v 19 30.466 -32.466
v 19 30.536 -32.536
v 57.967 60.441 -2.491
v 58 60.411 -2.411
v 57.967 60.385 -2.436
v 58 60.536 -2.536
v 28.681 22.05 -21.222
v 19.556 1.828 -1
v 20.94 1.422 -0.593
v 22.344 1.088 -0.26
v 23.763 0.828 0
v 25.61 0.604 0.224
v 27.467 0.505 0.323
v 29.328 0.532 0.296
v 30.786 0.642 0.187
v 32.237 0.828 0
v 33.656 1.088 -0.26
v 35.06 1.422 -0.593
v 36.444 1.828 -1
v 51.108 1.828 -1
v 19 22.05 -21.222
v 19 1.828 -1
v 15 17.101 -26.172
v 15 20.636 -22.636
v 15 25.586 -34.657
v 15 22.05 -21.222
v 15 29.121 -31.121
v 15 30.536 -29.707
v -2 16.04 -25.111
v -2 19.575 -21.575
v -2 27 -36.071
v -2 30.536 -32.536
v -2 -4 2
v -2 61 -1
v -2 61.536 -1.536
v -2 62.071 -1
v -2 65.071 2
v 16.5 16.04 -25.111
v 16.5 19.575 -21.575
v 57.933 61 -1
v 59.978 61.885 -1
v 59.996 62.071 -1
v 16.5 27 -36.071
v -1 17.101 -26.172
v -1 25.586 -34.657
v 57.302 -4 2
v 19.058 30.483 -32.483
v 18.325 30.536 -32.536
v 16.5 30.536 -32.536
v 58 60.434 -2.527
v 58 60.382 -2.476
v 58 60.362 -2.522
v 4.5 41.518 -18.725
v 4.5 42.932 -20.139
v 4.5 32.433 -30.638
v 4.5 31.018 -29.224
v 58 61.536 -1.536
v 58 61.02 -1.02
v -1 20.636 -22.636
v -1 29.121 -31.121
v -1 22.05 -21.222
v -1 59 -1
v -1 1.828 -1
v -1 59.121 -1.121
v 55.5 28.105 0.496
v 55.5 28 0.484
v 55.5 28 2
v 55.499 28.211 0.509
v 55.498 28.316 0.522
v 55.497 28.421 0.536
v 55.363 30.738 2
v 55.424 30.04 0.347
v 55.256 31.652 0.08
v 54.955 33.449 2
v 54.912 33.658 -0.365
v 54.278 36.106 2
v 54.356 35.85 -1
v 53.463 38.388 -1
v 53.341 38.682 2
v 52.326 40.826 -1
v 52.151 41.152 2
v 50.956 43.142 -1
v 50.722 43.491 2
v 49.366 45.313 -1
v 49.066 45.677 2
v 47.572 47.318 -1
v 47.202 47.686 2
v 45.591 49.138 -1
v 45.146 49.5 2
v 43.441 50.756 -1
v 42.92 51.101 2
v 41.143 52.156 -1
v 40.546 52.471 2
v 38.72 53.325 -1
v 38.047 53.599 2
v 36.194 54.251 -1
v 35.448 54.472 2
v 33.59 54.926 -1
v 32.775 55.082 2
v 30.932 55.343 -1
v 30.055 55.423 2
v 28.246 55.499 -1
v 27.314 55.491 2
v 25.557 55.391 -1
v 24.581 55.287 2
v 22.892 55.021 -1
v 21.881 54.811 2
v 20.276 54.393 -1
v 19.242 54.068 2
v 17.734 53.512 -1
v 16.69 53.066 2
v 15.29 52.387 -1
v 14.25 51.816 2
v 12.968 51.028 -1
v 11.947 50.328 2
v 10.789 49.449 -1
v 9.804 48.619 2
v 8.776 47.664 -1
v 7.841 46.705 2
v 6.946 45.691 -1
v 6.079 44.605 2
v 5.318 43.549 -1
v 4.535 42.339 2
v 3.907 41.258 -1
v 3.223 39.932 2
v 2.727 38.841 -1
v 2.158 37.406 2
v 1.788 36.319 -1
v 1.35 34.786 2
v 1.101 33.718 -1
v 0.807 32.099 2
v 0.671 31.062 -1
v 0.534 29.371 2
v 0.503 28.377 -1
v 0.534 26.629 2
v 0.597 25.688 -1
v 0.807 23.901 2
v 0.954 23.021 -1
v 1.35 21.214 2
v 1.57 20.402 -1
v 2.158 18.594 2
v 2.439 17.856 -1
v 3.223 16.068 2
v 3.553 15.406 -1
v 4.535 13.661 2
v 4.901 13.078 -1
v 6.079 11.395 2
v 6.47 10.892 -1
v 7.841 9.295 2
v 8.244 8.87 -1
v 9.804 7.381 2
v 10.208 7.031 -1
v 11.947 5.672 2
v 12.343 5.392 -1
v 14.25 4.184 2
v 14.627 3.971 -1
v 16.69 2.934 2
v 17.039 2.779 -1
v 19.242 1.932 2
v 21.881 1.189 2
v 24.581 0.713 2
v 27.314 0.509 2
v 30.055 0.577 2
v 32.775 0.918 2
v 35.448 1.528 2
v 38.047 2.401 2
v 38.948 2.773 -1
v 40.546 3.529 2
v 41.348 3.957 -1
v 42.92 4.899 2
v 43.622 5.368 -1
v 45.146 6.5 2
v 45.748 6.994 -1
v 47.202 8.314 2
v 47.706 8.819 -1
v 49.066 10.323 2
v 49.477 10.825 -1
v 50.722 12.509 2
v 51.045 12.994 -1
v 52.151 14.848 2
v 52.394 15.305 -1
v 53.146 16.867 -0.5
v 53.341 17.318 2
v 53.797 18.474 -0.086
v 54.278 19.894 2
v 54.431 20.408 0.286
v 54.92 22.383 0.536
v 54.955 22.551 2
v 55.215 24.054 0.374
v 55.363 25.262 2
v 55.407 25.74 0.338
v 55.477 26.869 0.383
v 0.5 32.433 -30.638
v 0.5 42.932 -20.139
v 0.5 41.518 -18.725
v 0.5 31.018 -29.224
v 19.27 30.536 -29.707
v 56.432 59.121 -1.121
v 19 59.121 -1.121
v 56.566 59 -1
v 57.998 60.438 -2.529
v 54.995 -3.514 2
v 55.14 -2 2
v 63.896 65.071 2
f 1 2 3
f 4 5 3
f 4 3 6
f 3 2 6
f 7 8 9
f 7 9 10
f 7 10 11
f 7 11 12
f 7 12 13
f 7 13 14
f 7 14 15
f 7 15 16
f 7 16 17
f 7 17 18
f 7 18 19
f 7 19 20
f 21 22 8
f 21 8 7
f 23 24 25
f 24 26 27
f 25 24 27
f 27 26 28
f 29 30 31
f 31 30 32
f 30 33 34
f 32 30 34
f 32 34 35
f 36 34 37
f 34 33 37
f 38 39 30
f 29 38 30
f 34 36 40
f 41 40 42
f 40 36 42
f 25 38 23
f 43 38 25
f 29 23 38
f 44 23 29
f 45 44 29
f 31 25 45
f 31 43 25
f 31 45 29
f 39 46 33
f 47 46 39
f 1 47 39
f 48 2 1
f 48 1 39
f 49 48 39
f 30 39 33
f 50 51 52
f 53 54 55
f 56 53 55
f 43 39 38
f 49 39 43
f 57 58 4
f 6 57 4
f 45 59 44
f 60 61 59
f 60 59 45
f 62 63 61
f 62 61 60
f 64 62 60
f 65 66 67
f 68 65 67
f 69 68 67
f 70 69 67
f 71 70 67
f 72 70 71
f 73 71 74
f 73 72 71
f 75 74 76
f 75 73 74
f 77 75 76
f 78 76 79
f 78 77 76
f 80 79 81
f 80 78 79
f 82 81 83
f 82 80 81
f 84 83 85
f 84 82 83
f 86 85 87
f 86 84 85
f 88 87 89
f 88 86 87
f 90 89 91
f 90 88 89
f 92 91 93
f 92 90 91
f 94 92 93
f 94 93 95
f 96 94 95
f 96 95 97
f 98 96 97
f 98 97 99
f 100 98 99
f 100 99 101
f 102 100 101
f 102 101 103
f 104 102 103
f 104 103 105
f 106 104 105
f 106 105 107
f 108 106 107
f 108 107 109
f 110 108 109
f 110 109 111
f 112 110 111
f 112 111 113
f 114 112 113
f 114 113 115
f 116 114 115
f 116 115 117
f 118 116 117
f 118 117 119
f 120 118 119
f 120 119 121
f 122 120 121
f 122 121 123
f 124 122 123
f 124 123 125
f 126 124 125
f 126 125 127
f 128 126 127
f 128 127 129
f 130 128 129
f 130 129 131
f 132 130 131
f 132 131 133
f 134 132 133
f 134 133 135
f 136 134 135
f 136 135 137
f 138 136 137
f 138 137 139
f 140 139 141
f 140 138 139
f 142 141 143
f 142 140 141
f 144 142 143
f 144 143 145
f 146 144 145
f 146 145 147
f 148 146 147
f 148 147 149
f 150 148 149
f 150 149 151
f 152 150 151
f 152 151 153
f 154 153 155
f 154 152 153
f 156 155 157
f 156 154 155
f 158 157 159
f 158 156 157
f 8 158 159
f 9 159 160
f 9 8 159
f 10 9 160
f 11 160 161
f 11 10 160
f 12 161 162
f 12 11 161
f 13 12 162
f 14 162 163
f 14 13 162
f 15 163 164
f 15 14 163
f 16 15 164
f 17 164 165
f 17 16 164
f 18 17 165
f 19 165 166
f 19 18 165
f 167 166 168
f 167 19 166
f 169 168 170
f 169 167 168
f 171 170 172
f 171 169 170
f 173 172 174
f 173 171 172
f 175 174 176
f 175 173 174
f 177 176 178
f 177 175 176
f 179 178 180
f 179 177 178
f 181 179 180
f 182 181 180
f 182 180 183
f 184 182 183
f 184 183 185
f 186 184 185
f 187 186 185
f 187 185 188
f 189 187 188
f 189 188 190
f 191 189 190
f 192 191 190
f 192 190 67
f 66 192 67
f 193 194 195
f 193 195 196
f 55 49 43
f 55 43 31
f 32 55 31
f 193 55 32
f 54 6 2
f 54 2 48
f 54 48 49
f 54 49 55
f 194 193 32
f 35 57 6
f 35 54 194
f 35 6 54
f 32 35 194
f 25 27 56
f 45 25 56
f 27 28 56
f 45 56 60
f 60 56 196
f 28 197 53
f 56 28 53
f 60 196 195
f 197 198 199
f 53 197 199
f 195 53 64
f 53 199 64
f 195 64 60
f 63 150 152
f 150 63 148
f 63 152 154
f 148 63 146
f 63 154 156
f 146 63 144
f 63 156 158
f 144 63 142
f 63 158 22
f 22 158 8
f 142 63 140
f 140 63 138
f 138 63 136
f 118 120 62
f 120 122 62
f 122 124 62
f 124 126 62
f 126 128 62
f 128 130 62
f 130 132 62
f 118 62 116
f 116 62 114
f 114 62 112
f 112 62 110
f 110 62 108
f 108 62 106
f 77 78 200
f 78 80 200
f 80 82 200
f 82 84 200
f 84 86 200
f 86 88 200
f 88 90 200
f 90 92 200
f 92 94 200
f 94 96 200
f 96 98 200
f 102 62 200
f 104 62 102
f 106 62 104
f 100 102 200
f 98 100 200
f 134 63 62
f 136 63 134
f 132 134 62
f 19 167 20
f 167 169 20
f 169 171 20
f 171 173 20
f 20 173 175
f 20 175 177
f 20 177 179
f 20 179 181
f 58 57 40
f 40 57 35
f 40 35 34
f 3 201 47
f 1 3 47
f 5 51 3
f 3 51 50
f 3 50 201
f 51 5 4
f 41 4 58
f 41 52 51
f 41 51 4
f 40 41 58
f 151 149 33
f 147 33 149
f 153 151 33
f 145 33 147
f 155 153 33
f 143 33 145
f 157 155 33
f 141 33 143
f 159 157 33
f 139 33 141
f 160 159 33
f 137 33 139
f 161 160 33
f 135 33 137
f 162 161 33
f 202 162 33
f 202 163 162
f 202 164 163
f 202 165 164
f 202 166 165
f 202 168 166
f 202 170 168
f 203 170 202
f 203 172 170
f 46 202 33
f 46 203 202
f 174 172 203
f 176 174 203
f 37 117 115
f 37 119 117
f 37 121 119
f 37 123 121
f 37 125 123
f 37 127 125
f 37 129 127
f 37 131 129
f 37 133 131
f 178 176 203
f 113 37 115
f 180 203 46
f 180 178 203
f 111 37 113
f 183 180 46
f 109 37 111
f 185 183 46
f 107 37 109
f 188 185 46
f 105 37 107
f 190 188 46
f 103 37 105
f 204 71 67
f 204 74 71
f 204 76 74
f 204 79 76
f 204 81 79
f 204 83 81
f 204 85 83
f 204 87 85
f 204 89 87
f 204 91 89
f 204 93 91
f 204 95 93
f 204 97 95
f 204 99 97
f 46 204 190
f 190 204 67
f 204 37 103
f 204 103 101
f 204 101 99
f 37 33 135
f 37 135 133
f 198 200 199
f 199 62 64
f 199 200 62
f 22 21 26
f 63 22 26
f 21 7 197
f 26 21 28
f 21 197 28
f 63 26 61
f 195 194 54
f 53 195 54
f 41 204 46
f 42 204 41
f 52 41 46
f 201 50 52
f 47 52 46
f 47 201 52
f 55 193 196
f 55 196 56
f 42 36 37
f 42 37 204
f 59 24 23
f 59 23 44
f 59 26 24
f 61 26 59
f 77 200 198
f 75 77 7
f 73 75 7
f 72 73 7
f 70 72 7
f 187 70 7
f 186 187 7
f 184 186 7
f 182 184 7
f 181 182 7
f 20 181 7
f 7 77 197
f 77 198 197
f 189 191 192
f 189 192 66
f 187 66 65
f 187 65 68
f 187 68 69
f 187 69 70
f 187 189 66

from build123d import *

# Parameters (mm, degrees)
SKETCH1_W            = 60
SKETCH1_H            = 60
SKETCH1_R            = 27.5
BOSS_EXTRUDE2_DEPTH  = 2
BOSS_EXTRUDE3_DEPTH  = 1
BOSS_EXTRUDE4_DEPTH  = 59
BOSS_EXTRUDE5_DEPTH  = 20
SKETCH6_W            = 4
SKETCH6_H            = 14.848240743
CUT_EXTRUDE1_DEPTH   = 20
BOSS_EXTRUDE6_DEPTH  = 2
SKETCH9_W            = 21
SKETCH9_H            = 33.426406871
BOSS_EXTRUDE8_DEPTH  = 2
SKETCH11_W           = 57.719066806
SKETCH11_H           = 59.906444101
BOSS_EXTRUDE9_DEPTH  = 1.5
CUT_EXTRUDE3_DEPTH   = 44.570078861
BOSS_EXTRUDE10_REACH = 41.922
CUT_EXTRUDE4_DEPTH   = 26.5
SKETCH15_W           = 98.795654727
SKETCH15_H           = 69.251879537
CUT_EXTRUDE5_DEPTH   = 59.5
SKETCH16_R           = 67.668555037
CUT_EXTRUDE6_DEPTH   = 1093.5
SKETCH17_R           = 80.414803425
CUT_EXTRUDE7_DEPTH   = 212.5
SKETCH18_W           = 81.243812254
SKETCH18_H           = 75.888975698
SKETCH18_R           = 27.5
BOSS_EXTRUDE12_DEPTH = 3
BOSS_EXTRUDE13_DEPTH = 2
SKETCH20_R           = 82.636183776
CUT_EXTRUDE8_DEPTH   = 100
SKETCH21_R           = 85.046347758
CUT_EXTRUDE9_DEPTH   = 22
SKETCH23_R           = 93.159906211
CUT_EXTRUDE11_DEPTH  = 94
SKETCH24_R           = 86.281354965
CUT_EXTRUDE12_DEPTH  = 48
SKETCH25_R           = 66.198443884
CUT_EXTRUDE13_DEPTH  = 170
BOSS_EXTRUDE14_DEPTH = 2
SKETCH27_W           = 18.5
SKETCH27_H           = 15.5
SKETCH27_W_2         = 16
SKETCH27_H_2         = 12
BOSS_EXTRUDE15_DEPTH = 5


with BuildPart() as part:
    # Sketch1 → Boss-Extrude2 (new body)
    with BuildSketch(Plane.XY):
        with Locations((28, 28)):
            Rectangle(SKETCH1_W, SKETCH1_H)
        with Locations((28, 28)):
            Circle(SKETCH1_R, mode=Mode.SUBTRACT)
    extrude(amount=BOSS_EXTRUDE2_DEPTH)

    # Sketch2 → Boss-Extrude3 (add)
    with BuildSketch(Plane.ZY.offset(2)):
        Polygon((2, 58), (-1.535533906, 61.535533906), (-32.535533906, 30.535533906), (0, -2), (0, 58), align=None)
    extrude(amount=-BOSS_EXTRUDE3_DEPTH)

    # Sketch3 → Boss-Extrude4 (add)
    with BuildSketch(Plane(origin=(-1, 0, 0), x_dir=(0, 0, -1), z_dir=(1, 0, 0))):
        Polygon((0, 58), (2.535533906, 60.535533906), (1.535533906, 61.535533906), (-2, 58), align=None)
    extrude(amount=BOSS_EXTRUDE4_DEPTH)

    # Sketch5 → Boss-Extrude5 (add)
    with BuildSketch(Plane(origin=(-1, 0, 0), x_dir=(0, 0, -1), z_dir=(1, 0, 0))):
        Polygon((2.535533906, 60.535533906), (32.535533906, 30.535533906), (31.121320344, 29.121320344), (1.121320344, 59.121320344), align=None)
    extrude(amount=BOSS_EXTRUDE5_DEPTH)

    # Sketch6 → Cut-Extrude1 (cut)
    with BuildSketch(Plane(origin=(0, 31.535533906, -31.535533906), x_dir=(1, 0, 0), z_dir=(0, 0.707106781, -0.707106781))):
        with Locations((2.5, -8.692828461)):
            Rectangle(SKETCH6_W, SKETCH6_H)
    extrude(amount=-CUT_EXTRUDE1_DEPTH, mode=Mode.SUBTRACT)

    # Sketch7 → Boss-Extrude6 (add)
    with BuildSketch(Plane(origin=(0, 31.535533906, -31.535533906), x_dir=(1, 0, 0), z_dir=(0, 0.707106781, -0.707106781))):
        Polygon((19, 1.414213562), (58, -41.012193309), (19, -41.012193309), align=None)
    extrude(amount=-BOSS_EXTRUDE6_DEPTH)

    # Sketch9 → Boss-Extrude8 (add)
    with BuildSketch(Plane(origin=(0, -1, -1), x_dir=(-1, 0, 0), z_dir=(0, -0.707106781, -0.707106781))):
        with Locations((-8.5, 13.884776311)):
            Rectangle(SKETCH9_W, SKETCH9_H)
    extrude(amount=-BOSS_EXTRUDE8_DEPTH)

    # Sketch11 → Boss-Extrude9 (add)
    with BuildSketch(Plane(origin=(22.469349188, -2.1452201, -27.064933845), x_dir=(-0.676752968, -0.520579206, -0.520579206), z_dir=(0.637576713, -0.060871473, -0.767978254))):
        with Locations((-40.536850198, 1.112103584)):
            Rectangle(SKETCH11_W, SKETCH11_H)
    extrude(amount=-BOSS_EXTRUDE9_DEPTH)

    # Sketch12 → Cut-Extrude3 (cut, through all)
    with BuildSketch(Plane(origin=(21.512984119, -2.053912891, -25.912966464), x_dir=(0.770386874, 0.050377589, 0.635583325), z_dir=(-0.637576713, 0.060871473, 0.767978254))):
        Polygon((43.649580839, -2.15177531), (42.724580914, -9.59239755), (74.742668884, 7.823146391), (47.317707346, 58.243324712), align=None)
    extrude(amount=-CUT_EXTRUDE3_DEPTH, mode=Mode.SUBTRACT)

    # Boss-Extrude10: up to this face of the body (flat: up to its plane)
    boss_extrude10_end = Plane(part.part.faces().sort_by_distance((41.682824106, 19.529388287, -10.878669739))[0])
    # Sketch13 → Boss-Extrude10 (add, up to the picked face)
    with BuildSketch(Plane(origin=(19, 0, 0), x_dir=(0, 0, -1), z_dir=(1, 0, 0)), mode=Mode.PRIVATE) as boss_extrude10_sk1:
        Polygon((21.221825407, 22.050252532), (22.636038969, 20.636038969), (-1, -3), (-2.414213562, -1.585786438), align=None)
    boss_extrude10_tool1 = split(extrude(boss_extrude10_sk1.sketch, amount=BOSS_EXTRUDE10_REACH, mode=Mode.PRIVATE), bisect_by=boss_extrude10_end, keep=Keep.BOTH, mode=Mode.PRIVATE)
    add(boss_extrude10_tool1.solids().sort_by_distance((19, 9.525126, -10.110913))[0])

    # Sketch14 → Cut-Extrude4 (cut)
    with BuildSketch(Plane(origin=(21.512984119, -2.053912891, -25.912966464), x_dir=(0.770386874, 0.050377589, 0.635583325), z_dir=(-0.637576713, 0.060871473, 0.767978254))):
        Polygon((41.962116988, -3.069634642), (7.93553086, 22.360087902), (-27.775626078, 49.048772133), (11.868884468, -40.106499749), (63.912471384, -11.732484985), align=None)
    extrude(amount=-CUT_EXTRUDE4_DEPTH, mode=Mode.SUBTRACT)

    # Sketch15 → Cut-Extrude5 (cut)
    with BuildSketch(Plane(origin=(0, -1, -1), x_dir=(-1, 0, 0), z_dir=(0, -0.707106781, -0.707106781))):
        with Locations((-41.379570233, 23.483837132)):
            Rectangle(SKETCH15_W, SKETCH15_H)
    extrude(amount=CUT_EXTRUDE5_DEPTH, mode=Mode.SUBTRACT)

    # Sketch16 → Cut-Extrude6 (cut)
    with BuildSketch(Plane(origin=(22.469349188, -2.1452201, -27.064933845), x_dir=(-0.770386874, -0.050377589, -0.635583325), z_dir=(0.637576713, -0.060871473, -0.767978254))):
        with Locations((-31.476014369, 28.909090329)):
            Circle(SKETCH16_R)
    extrude(amount=CUT_EXTRUDE6_DEPTH, mode=Mode.SUBTRACT)

    # Sketch17 → Cut-Extrude7 (cut)
    with BuildSketch(Plane(origin=(58, 0, 0), x_dir=(0, 0, -1), z_dir=(1, 0, 0))):
        with Locations((-1.230106157, 56.933870915)):
            Circle(SKETCH17_R)
    extrude(amount=CUT_EXTRUDE7_DEPTH, mode=Mode.SUBTRACT)

    # Sketch18 → Boss-Extrude12 (add)
    with BuildSketch(Plane.XY.offset(2)):
        with Locations((28, 28)):
            Rectangle(SKETCH18_W, SKETCH18_H)
        with Locations((28, 28)):
            Circle(SKETCH18_R, mode=Mode.SUBTRACT)
    extrude(amount=-BOSS_EXTRUDE12_DEPTH)

    # Sketch19 → Boss-Extrude13 (add)
    with BuildSketch(Plane(origin=(22.469349188, -2.1452201, -27.064933845), x_dir=(-0.770386874, -0.050377589, -0.635583325), z_dir=(0.637576713, -0.060871473, -0.767978254))):
        Polygon((-48.688581729, 61.770152877), (-46.120529867, 41.112957892), (-46.120529867, 60.372277801), align=None)
        Polygon((-46.120529867, 41.112957892), (-40.895361663, -0.917859332), (4.352561758, 32.898114271), (-46.120529867, 60.372277801), align=None)
    extrude(amount=-BOSS_EXTRUDE13_DEPTH)

    # Sketch20 → Cut-Extrude8 (cut)
    with BuildSketch(Plane(origin=(22.469349188, -2.1452201, -27.064933845), x_dir=(-0.770386874, -0.050377589, -0.635583325), z_dir=(0.637576713, -0.060871473, -0.767978254))):
        with Locations((-26.945010232, 29.388055989)):
            Circle(SKETCH20_R)
    extrude(amount=CUT_EXTRUDE8_DEPTH, mode=Mode.SUBTRACT)

    # Sketch21 → Cut-Extrude9 (cut)
    with BuildSketch(Plane(origin=(0, 31.535533906, -31.535533906), x_dir=(1, 0, 0), z_dir=(0, 0.707106781, -0.707106781))):
        with Locations((19.590538608, -26.723706738)):
            Circle(SKETCH21_R)
    extrude(amount=CUT_EXTRUDE9_DEPTH, mode=Mode.SUBTRACT)

    # Sketch23 → Cut-Extrude11 (cut)
    with BuildSketch(Plane.ZY.offset(2)):
        with Locations((-13.361611356, 29.287919071)):
            Circle(SKETCH23_R)
    extrude(amount=CUT_EXTRUDE11_DEPTH, mode=Mode.SUBTRACT)

    # Sketch24 → Cut-Extrude12 (cut)
    with BuildSketch(Plane(origin=(0, -1, -1), x_dir=(-1, 0, 0), z_dir=(0, -0.707106781, -0.707106781))):
        with Locations((-12.739775939, 17.868647739)):
            Circle(SKETCH24_R)
    extrude(amount=CUT_EXTRUDE12_DEPTH, mode=Mode.SUBTRACT)

    # Sketch25 → Cut-Extrude13 (cut)
    with BuildSketch(Plane.XY.offset(2)):
        with Locations((30.355803371, 29.212907652)):
            Circle(SKETCH25_R)
    extrude(amount=CUT_EXTRUDE13_DEPTH, mode=Mode.SUBTRACT)

    # Sketch26 → Boss-Extrude14 (add)
    with BuildSketch(Plane(origin=(0, -1, -1), x_dir=(-1, 0, 0), z_dir=(0, -0.707106781, -0.707106781))):
        Polygon((-15, 30.597979746), (-15, 44.597979746), (-18.325381464, 44.597979746), (-30.150830661, 29.463089368), (-15, 29.463089368), align=None)
    extrude(amount=-BOSS_EXTRUDE14_DEPTH)

    # Sketch27 → Boss-Extrude15 (add)
    with BuildSketch(Plane(origin=(0, -1, -1), x_dir=(-1, 0, 0), z_dir=(0, -0.707106781, -0.707106781))):
        with Locations((-7.25, 36.847979746)):
            Rectangle(SKETCH27_W, SKETCH27_H)
        with Locations((-7, 36.597979746)):
            Rectangle(SKETCH27_W_2, SKETCH27_H_2, mode=Mode.SUBTRACT)
    extrude(amount=BOSS_EXTRUDE15_DEPTH)


solid = part.part
